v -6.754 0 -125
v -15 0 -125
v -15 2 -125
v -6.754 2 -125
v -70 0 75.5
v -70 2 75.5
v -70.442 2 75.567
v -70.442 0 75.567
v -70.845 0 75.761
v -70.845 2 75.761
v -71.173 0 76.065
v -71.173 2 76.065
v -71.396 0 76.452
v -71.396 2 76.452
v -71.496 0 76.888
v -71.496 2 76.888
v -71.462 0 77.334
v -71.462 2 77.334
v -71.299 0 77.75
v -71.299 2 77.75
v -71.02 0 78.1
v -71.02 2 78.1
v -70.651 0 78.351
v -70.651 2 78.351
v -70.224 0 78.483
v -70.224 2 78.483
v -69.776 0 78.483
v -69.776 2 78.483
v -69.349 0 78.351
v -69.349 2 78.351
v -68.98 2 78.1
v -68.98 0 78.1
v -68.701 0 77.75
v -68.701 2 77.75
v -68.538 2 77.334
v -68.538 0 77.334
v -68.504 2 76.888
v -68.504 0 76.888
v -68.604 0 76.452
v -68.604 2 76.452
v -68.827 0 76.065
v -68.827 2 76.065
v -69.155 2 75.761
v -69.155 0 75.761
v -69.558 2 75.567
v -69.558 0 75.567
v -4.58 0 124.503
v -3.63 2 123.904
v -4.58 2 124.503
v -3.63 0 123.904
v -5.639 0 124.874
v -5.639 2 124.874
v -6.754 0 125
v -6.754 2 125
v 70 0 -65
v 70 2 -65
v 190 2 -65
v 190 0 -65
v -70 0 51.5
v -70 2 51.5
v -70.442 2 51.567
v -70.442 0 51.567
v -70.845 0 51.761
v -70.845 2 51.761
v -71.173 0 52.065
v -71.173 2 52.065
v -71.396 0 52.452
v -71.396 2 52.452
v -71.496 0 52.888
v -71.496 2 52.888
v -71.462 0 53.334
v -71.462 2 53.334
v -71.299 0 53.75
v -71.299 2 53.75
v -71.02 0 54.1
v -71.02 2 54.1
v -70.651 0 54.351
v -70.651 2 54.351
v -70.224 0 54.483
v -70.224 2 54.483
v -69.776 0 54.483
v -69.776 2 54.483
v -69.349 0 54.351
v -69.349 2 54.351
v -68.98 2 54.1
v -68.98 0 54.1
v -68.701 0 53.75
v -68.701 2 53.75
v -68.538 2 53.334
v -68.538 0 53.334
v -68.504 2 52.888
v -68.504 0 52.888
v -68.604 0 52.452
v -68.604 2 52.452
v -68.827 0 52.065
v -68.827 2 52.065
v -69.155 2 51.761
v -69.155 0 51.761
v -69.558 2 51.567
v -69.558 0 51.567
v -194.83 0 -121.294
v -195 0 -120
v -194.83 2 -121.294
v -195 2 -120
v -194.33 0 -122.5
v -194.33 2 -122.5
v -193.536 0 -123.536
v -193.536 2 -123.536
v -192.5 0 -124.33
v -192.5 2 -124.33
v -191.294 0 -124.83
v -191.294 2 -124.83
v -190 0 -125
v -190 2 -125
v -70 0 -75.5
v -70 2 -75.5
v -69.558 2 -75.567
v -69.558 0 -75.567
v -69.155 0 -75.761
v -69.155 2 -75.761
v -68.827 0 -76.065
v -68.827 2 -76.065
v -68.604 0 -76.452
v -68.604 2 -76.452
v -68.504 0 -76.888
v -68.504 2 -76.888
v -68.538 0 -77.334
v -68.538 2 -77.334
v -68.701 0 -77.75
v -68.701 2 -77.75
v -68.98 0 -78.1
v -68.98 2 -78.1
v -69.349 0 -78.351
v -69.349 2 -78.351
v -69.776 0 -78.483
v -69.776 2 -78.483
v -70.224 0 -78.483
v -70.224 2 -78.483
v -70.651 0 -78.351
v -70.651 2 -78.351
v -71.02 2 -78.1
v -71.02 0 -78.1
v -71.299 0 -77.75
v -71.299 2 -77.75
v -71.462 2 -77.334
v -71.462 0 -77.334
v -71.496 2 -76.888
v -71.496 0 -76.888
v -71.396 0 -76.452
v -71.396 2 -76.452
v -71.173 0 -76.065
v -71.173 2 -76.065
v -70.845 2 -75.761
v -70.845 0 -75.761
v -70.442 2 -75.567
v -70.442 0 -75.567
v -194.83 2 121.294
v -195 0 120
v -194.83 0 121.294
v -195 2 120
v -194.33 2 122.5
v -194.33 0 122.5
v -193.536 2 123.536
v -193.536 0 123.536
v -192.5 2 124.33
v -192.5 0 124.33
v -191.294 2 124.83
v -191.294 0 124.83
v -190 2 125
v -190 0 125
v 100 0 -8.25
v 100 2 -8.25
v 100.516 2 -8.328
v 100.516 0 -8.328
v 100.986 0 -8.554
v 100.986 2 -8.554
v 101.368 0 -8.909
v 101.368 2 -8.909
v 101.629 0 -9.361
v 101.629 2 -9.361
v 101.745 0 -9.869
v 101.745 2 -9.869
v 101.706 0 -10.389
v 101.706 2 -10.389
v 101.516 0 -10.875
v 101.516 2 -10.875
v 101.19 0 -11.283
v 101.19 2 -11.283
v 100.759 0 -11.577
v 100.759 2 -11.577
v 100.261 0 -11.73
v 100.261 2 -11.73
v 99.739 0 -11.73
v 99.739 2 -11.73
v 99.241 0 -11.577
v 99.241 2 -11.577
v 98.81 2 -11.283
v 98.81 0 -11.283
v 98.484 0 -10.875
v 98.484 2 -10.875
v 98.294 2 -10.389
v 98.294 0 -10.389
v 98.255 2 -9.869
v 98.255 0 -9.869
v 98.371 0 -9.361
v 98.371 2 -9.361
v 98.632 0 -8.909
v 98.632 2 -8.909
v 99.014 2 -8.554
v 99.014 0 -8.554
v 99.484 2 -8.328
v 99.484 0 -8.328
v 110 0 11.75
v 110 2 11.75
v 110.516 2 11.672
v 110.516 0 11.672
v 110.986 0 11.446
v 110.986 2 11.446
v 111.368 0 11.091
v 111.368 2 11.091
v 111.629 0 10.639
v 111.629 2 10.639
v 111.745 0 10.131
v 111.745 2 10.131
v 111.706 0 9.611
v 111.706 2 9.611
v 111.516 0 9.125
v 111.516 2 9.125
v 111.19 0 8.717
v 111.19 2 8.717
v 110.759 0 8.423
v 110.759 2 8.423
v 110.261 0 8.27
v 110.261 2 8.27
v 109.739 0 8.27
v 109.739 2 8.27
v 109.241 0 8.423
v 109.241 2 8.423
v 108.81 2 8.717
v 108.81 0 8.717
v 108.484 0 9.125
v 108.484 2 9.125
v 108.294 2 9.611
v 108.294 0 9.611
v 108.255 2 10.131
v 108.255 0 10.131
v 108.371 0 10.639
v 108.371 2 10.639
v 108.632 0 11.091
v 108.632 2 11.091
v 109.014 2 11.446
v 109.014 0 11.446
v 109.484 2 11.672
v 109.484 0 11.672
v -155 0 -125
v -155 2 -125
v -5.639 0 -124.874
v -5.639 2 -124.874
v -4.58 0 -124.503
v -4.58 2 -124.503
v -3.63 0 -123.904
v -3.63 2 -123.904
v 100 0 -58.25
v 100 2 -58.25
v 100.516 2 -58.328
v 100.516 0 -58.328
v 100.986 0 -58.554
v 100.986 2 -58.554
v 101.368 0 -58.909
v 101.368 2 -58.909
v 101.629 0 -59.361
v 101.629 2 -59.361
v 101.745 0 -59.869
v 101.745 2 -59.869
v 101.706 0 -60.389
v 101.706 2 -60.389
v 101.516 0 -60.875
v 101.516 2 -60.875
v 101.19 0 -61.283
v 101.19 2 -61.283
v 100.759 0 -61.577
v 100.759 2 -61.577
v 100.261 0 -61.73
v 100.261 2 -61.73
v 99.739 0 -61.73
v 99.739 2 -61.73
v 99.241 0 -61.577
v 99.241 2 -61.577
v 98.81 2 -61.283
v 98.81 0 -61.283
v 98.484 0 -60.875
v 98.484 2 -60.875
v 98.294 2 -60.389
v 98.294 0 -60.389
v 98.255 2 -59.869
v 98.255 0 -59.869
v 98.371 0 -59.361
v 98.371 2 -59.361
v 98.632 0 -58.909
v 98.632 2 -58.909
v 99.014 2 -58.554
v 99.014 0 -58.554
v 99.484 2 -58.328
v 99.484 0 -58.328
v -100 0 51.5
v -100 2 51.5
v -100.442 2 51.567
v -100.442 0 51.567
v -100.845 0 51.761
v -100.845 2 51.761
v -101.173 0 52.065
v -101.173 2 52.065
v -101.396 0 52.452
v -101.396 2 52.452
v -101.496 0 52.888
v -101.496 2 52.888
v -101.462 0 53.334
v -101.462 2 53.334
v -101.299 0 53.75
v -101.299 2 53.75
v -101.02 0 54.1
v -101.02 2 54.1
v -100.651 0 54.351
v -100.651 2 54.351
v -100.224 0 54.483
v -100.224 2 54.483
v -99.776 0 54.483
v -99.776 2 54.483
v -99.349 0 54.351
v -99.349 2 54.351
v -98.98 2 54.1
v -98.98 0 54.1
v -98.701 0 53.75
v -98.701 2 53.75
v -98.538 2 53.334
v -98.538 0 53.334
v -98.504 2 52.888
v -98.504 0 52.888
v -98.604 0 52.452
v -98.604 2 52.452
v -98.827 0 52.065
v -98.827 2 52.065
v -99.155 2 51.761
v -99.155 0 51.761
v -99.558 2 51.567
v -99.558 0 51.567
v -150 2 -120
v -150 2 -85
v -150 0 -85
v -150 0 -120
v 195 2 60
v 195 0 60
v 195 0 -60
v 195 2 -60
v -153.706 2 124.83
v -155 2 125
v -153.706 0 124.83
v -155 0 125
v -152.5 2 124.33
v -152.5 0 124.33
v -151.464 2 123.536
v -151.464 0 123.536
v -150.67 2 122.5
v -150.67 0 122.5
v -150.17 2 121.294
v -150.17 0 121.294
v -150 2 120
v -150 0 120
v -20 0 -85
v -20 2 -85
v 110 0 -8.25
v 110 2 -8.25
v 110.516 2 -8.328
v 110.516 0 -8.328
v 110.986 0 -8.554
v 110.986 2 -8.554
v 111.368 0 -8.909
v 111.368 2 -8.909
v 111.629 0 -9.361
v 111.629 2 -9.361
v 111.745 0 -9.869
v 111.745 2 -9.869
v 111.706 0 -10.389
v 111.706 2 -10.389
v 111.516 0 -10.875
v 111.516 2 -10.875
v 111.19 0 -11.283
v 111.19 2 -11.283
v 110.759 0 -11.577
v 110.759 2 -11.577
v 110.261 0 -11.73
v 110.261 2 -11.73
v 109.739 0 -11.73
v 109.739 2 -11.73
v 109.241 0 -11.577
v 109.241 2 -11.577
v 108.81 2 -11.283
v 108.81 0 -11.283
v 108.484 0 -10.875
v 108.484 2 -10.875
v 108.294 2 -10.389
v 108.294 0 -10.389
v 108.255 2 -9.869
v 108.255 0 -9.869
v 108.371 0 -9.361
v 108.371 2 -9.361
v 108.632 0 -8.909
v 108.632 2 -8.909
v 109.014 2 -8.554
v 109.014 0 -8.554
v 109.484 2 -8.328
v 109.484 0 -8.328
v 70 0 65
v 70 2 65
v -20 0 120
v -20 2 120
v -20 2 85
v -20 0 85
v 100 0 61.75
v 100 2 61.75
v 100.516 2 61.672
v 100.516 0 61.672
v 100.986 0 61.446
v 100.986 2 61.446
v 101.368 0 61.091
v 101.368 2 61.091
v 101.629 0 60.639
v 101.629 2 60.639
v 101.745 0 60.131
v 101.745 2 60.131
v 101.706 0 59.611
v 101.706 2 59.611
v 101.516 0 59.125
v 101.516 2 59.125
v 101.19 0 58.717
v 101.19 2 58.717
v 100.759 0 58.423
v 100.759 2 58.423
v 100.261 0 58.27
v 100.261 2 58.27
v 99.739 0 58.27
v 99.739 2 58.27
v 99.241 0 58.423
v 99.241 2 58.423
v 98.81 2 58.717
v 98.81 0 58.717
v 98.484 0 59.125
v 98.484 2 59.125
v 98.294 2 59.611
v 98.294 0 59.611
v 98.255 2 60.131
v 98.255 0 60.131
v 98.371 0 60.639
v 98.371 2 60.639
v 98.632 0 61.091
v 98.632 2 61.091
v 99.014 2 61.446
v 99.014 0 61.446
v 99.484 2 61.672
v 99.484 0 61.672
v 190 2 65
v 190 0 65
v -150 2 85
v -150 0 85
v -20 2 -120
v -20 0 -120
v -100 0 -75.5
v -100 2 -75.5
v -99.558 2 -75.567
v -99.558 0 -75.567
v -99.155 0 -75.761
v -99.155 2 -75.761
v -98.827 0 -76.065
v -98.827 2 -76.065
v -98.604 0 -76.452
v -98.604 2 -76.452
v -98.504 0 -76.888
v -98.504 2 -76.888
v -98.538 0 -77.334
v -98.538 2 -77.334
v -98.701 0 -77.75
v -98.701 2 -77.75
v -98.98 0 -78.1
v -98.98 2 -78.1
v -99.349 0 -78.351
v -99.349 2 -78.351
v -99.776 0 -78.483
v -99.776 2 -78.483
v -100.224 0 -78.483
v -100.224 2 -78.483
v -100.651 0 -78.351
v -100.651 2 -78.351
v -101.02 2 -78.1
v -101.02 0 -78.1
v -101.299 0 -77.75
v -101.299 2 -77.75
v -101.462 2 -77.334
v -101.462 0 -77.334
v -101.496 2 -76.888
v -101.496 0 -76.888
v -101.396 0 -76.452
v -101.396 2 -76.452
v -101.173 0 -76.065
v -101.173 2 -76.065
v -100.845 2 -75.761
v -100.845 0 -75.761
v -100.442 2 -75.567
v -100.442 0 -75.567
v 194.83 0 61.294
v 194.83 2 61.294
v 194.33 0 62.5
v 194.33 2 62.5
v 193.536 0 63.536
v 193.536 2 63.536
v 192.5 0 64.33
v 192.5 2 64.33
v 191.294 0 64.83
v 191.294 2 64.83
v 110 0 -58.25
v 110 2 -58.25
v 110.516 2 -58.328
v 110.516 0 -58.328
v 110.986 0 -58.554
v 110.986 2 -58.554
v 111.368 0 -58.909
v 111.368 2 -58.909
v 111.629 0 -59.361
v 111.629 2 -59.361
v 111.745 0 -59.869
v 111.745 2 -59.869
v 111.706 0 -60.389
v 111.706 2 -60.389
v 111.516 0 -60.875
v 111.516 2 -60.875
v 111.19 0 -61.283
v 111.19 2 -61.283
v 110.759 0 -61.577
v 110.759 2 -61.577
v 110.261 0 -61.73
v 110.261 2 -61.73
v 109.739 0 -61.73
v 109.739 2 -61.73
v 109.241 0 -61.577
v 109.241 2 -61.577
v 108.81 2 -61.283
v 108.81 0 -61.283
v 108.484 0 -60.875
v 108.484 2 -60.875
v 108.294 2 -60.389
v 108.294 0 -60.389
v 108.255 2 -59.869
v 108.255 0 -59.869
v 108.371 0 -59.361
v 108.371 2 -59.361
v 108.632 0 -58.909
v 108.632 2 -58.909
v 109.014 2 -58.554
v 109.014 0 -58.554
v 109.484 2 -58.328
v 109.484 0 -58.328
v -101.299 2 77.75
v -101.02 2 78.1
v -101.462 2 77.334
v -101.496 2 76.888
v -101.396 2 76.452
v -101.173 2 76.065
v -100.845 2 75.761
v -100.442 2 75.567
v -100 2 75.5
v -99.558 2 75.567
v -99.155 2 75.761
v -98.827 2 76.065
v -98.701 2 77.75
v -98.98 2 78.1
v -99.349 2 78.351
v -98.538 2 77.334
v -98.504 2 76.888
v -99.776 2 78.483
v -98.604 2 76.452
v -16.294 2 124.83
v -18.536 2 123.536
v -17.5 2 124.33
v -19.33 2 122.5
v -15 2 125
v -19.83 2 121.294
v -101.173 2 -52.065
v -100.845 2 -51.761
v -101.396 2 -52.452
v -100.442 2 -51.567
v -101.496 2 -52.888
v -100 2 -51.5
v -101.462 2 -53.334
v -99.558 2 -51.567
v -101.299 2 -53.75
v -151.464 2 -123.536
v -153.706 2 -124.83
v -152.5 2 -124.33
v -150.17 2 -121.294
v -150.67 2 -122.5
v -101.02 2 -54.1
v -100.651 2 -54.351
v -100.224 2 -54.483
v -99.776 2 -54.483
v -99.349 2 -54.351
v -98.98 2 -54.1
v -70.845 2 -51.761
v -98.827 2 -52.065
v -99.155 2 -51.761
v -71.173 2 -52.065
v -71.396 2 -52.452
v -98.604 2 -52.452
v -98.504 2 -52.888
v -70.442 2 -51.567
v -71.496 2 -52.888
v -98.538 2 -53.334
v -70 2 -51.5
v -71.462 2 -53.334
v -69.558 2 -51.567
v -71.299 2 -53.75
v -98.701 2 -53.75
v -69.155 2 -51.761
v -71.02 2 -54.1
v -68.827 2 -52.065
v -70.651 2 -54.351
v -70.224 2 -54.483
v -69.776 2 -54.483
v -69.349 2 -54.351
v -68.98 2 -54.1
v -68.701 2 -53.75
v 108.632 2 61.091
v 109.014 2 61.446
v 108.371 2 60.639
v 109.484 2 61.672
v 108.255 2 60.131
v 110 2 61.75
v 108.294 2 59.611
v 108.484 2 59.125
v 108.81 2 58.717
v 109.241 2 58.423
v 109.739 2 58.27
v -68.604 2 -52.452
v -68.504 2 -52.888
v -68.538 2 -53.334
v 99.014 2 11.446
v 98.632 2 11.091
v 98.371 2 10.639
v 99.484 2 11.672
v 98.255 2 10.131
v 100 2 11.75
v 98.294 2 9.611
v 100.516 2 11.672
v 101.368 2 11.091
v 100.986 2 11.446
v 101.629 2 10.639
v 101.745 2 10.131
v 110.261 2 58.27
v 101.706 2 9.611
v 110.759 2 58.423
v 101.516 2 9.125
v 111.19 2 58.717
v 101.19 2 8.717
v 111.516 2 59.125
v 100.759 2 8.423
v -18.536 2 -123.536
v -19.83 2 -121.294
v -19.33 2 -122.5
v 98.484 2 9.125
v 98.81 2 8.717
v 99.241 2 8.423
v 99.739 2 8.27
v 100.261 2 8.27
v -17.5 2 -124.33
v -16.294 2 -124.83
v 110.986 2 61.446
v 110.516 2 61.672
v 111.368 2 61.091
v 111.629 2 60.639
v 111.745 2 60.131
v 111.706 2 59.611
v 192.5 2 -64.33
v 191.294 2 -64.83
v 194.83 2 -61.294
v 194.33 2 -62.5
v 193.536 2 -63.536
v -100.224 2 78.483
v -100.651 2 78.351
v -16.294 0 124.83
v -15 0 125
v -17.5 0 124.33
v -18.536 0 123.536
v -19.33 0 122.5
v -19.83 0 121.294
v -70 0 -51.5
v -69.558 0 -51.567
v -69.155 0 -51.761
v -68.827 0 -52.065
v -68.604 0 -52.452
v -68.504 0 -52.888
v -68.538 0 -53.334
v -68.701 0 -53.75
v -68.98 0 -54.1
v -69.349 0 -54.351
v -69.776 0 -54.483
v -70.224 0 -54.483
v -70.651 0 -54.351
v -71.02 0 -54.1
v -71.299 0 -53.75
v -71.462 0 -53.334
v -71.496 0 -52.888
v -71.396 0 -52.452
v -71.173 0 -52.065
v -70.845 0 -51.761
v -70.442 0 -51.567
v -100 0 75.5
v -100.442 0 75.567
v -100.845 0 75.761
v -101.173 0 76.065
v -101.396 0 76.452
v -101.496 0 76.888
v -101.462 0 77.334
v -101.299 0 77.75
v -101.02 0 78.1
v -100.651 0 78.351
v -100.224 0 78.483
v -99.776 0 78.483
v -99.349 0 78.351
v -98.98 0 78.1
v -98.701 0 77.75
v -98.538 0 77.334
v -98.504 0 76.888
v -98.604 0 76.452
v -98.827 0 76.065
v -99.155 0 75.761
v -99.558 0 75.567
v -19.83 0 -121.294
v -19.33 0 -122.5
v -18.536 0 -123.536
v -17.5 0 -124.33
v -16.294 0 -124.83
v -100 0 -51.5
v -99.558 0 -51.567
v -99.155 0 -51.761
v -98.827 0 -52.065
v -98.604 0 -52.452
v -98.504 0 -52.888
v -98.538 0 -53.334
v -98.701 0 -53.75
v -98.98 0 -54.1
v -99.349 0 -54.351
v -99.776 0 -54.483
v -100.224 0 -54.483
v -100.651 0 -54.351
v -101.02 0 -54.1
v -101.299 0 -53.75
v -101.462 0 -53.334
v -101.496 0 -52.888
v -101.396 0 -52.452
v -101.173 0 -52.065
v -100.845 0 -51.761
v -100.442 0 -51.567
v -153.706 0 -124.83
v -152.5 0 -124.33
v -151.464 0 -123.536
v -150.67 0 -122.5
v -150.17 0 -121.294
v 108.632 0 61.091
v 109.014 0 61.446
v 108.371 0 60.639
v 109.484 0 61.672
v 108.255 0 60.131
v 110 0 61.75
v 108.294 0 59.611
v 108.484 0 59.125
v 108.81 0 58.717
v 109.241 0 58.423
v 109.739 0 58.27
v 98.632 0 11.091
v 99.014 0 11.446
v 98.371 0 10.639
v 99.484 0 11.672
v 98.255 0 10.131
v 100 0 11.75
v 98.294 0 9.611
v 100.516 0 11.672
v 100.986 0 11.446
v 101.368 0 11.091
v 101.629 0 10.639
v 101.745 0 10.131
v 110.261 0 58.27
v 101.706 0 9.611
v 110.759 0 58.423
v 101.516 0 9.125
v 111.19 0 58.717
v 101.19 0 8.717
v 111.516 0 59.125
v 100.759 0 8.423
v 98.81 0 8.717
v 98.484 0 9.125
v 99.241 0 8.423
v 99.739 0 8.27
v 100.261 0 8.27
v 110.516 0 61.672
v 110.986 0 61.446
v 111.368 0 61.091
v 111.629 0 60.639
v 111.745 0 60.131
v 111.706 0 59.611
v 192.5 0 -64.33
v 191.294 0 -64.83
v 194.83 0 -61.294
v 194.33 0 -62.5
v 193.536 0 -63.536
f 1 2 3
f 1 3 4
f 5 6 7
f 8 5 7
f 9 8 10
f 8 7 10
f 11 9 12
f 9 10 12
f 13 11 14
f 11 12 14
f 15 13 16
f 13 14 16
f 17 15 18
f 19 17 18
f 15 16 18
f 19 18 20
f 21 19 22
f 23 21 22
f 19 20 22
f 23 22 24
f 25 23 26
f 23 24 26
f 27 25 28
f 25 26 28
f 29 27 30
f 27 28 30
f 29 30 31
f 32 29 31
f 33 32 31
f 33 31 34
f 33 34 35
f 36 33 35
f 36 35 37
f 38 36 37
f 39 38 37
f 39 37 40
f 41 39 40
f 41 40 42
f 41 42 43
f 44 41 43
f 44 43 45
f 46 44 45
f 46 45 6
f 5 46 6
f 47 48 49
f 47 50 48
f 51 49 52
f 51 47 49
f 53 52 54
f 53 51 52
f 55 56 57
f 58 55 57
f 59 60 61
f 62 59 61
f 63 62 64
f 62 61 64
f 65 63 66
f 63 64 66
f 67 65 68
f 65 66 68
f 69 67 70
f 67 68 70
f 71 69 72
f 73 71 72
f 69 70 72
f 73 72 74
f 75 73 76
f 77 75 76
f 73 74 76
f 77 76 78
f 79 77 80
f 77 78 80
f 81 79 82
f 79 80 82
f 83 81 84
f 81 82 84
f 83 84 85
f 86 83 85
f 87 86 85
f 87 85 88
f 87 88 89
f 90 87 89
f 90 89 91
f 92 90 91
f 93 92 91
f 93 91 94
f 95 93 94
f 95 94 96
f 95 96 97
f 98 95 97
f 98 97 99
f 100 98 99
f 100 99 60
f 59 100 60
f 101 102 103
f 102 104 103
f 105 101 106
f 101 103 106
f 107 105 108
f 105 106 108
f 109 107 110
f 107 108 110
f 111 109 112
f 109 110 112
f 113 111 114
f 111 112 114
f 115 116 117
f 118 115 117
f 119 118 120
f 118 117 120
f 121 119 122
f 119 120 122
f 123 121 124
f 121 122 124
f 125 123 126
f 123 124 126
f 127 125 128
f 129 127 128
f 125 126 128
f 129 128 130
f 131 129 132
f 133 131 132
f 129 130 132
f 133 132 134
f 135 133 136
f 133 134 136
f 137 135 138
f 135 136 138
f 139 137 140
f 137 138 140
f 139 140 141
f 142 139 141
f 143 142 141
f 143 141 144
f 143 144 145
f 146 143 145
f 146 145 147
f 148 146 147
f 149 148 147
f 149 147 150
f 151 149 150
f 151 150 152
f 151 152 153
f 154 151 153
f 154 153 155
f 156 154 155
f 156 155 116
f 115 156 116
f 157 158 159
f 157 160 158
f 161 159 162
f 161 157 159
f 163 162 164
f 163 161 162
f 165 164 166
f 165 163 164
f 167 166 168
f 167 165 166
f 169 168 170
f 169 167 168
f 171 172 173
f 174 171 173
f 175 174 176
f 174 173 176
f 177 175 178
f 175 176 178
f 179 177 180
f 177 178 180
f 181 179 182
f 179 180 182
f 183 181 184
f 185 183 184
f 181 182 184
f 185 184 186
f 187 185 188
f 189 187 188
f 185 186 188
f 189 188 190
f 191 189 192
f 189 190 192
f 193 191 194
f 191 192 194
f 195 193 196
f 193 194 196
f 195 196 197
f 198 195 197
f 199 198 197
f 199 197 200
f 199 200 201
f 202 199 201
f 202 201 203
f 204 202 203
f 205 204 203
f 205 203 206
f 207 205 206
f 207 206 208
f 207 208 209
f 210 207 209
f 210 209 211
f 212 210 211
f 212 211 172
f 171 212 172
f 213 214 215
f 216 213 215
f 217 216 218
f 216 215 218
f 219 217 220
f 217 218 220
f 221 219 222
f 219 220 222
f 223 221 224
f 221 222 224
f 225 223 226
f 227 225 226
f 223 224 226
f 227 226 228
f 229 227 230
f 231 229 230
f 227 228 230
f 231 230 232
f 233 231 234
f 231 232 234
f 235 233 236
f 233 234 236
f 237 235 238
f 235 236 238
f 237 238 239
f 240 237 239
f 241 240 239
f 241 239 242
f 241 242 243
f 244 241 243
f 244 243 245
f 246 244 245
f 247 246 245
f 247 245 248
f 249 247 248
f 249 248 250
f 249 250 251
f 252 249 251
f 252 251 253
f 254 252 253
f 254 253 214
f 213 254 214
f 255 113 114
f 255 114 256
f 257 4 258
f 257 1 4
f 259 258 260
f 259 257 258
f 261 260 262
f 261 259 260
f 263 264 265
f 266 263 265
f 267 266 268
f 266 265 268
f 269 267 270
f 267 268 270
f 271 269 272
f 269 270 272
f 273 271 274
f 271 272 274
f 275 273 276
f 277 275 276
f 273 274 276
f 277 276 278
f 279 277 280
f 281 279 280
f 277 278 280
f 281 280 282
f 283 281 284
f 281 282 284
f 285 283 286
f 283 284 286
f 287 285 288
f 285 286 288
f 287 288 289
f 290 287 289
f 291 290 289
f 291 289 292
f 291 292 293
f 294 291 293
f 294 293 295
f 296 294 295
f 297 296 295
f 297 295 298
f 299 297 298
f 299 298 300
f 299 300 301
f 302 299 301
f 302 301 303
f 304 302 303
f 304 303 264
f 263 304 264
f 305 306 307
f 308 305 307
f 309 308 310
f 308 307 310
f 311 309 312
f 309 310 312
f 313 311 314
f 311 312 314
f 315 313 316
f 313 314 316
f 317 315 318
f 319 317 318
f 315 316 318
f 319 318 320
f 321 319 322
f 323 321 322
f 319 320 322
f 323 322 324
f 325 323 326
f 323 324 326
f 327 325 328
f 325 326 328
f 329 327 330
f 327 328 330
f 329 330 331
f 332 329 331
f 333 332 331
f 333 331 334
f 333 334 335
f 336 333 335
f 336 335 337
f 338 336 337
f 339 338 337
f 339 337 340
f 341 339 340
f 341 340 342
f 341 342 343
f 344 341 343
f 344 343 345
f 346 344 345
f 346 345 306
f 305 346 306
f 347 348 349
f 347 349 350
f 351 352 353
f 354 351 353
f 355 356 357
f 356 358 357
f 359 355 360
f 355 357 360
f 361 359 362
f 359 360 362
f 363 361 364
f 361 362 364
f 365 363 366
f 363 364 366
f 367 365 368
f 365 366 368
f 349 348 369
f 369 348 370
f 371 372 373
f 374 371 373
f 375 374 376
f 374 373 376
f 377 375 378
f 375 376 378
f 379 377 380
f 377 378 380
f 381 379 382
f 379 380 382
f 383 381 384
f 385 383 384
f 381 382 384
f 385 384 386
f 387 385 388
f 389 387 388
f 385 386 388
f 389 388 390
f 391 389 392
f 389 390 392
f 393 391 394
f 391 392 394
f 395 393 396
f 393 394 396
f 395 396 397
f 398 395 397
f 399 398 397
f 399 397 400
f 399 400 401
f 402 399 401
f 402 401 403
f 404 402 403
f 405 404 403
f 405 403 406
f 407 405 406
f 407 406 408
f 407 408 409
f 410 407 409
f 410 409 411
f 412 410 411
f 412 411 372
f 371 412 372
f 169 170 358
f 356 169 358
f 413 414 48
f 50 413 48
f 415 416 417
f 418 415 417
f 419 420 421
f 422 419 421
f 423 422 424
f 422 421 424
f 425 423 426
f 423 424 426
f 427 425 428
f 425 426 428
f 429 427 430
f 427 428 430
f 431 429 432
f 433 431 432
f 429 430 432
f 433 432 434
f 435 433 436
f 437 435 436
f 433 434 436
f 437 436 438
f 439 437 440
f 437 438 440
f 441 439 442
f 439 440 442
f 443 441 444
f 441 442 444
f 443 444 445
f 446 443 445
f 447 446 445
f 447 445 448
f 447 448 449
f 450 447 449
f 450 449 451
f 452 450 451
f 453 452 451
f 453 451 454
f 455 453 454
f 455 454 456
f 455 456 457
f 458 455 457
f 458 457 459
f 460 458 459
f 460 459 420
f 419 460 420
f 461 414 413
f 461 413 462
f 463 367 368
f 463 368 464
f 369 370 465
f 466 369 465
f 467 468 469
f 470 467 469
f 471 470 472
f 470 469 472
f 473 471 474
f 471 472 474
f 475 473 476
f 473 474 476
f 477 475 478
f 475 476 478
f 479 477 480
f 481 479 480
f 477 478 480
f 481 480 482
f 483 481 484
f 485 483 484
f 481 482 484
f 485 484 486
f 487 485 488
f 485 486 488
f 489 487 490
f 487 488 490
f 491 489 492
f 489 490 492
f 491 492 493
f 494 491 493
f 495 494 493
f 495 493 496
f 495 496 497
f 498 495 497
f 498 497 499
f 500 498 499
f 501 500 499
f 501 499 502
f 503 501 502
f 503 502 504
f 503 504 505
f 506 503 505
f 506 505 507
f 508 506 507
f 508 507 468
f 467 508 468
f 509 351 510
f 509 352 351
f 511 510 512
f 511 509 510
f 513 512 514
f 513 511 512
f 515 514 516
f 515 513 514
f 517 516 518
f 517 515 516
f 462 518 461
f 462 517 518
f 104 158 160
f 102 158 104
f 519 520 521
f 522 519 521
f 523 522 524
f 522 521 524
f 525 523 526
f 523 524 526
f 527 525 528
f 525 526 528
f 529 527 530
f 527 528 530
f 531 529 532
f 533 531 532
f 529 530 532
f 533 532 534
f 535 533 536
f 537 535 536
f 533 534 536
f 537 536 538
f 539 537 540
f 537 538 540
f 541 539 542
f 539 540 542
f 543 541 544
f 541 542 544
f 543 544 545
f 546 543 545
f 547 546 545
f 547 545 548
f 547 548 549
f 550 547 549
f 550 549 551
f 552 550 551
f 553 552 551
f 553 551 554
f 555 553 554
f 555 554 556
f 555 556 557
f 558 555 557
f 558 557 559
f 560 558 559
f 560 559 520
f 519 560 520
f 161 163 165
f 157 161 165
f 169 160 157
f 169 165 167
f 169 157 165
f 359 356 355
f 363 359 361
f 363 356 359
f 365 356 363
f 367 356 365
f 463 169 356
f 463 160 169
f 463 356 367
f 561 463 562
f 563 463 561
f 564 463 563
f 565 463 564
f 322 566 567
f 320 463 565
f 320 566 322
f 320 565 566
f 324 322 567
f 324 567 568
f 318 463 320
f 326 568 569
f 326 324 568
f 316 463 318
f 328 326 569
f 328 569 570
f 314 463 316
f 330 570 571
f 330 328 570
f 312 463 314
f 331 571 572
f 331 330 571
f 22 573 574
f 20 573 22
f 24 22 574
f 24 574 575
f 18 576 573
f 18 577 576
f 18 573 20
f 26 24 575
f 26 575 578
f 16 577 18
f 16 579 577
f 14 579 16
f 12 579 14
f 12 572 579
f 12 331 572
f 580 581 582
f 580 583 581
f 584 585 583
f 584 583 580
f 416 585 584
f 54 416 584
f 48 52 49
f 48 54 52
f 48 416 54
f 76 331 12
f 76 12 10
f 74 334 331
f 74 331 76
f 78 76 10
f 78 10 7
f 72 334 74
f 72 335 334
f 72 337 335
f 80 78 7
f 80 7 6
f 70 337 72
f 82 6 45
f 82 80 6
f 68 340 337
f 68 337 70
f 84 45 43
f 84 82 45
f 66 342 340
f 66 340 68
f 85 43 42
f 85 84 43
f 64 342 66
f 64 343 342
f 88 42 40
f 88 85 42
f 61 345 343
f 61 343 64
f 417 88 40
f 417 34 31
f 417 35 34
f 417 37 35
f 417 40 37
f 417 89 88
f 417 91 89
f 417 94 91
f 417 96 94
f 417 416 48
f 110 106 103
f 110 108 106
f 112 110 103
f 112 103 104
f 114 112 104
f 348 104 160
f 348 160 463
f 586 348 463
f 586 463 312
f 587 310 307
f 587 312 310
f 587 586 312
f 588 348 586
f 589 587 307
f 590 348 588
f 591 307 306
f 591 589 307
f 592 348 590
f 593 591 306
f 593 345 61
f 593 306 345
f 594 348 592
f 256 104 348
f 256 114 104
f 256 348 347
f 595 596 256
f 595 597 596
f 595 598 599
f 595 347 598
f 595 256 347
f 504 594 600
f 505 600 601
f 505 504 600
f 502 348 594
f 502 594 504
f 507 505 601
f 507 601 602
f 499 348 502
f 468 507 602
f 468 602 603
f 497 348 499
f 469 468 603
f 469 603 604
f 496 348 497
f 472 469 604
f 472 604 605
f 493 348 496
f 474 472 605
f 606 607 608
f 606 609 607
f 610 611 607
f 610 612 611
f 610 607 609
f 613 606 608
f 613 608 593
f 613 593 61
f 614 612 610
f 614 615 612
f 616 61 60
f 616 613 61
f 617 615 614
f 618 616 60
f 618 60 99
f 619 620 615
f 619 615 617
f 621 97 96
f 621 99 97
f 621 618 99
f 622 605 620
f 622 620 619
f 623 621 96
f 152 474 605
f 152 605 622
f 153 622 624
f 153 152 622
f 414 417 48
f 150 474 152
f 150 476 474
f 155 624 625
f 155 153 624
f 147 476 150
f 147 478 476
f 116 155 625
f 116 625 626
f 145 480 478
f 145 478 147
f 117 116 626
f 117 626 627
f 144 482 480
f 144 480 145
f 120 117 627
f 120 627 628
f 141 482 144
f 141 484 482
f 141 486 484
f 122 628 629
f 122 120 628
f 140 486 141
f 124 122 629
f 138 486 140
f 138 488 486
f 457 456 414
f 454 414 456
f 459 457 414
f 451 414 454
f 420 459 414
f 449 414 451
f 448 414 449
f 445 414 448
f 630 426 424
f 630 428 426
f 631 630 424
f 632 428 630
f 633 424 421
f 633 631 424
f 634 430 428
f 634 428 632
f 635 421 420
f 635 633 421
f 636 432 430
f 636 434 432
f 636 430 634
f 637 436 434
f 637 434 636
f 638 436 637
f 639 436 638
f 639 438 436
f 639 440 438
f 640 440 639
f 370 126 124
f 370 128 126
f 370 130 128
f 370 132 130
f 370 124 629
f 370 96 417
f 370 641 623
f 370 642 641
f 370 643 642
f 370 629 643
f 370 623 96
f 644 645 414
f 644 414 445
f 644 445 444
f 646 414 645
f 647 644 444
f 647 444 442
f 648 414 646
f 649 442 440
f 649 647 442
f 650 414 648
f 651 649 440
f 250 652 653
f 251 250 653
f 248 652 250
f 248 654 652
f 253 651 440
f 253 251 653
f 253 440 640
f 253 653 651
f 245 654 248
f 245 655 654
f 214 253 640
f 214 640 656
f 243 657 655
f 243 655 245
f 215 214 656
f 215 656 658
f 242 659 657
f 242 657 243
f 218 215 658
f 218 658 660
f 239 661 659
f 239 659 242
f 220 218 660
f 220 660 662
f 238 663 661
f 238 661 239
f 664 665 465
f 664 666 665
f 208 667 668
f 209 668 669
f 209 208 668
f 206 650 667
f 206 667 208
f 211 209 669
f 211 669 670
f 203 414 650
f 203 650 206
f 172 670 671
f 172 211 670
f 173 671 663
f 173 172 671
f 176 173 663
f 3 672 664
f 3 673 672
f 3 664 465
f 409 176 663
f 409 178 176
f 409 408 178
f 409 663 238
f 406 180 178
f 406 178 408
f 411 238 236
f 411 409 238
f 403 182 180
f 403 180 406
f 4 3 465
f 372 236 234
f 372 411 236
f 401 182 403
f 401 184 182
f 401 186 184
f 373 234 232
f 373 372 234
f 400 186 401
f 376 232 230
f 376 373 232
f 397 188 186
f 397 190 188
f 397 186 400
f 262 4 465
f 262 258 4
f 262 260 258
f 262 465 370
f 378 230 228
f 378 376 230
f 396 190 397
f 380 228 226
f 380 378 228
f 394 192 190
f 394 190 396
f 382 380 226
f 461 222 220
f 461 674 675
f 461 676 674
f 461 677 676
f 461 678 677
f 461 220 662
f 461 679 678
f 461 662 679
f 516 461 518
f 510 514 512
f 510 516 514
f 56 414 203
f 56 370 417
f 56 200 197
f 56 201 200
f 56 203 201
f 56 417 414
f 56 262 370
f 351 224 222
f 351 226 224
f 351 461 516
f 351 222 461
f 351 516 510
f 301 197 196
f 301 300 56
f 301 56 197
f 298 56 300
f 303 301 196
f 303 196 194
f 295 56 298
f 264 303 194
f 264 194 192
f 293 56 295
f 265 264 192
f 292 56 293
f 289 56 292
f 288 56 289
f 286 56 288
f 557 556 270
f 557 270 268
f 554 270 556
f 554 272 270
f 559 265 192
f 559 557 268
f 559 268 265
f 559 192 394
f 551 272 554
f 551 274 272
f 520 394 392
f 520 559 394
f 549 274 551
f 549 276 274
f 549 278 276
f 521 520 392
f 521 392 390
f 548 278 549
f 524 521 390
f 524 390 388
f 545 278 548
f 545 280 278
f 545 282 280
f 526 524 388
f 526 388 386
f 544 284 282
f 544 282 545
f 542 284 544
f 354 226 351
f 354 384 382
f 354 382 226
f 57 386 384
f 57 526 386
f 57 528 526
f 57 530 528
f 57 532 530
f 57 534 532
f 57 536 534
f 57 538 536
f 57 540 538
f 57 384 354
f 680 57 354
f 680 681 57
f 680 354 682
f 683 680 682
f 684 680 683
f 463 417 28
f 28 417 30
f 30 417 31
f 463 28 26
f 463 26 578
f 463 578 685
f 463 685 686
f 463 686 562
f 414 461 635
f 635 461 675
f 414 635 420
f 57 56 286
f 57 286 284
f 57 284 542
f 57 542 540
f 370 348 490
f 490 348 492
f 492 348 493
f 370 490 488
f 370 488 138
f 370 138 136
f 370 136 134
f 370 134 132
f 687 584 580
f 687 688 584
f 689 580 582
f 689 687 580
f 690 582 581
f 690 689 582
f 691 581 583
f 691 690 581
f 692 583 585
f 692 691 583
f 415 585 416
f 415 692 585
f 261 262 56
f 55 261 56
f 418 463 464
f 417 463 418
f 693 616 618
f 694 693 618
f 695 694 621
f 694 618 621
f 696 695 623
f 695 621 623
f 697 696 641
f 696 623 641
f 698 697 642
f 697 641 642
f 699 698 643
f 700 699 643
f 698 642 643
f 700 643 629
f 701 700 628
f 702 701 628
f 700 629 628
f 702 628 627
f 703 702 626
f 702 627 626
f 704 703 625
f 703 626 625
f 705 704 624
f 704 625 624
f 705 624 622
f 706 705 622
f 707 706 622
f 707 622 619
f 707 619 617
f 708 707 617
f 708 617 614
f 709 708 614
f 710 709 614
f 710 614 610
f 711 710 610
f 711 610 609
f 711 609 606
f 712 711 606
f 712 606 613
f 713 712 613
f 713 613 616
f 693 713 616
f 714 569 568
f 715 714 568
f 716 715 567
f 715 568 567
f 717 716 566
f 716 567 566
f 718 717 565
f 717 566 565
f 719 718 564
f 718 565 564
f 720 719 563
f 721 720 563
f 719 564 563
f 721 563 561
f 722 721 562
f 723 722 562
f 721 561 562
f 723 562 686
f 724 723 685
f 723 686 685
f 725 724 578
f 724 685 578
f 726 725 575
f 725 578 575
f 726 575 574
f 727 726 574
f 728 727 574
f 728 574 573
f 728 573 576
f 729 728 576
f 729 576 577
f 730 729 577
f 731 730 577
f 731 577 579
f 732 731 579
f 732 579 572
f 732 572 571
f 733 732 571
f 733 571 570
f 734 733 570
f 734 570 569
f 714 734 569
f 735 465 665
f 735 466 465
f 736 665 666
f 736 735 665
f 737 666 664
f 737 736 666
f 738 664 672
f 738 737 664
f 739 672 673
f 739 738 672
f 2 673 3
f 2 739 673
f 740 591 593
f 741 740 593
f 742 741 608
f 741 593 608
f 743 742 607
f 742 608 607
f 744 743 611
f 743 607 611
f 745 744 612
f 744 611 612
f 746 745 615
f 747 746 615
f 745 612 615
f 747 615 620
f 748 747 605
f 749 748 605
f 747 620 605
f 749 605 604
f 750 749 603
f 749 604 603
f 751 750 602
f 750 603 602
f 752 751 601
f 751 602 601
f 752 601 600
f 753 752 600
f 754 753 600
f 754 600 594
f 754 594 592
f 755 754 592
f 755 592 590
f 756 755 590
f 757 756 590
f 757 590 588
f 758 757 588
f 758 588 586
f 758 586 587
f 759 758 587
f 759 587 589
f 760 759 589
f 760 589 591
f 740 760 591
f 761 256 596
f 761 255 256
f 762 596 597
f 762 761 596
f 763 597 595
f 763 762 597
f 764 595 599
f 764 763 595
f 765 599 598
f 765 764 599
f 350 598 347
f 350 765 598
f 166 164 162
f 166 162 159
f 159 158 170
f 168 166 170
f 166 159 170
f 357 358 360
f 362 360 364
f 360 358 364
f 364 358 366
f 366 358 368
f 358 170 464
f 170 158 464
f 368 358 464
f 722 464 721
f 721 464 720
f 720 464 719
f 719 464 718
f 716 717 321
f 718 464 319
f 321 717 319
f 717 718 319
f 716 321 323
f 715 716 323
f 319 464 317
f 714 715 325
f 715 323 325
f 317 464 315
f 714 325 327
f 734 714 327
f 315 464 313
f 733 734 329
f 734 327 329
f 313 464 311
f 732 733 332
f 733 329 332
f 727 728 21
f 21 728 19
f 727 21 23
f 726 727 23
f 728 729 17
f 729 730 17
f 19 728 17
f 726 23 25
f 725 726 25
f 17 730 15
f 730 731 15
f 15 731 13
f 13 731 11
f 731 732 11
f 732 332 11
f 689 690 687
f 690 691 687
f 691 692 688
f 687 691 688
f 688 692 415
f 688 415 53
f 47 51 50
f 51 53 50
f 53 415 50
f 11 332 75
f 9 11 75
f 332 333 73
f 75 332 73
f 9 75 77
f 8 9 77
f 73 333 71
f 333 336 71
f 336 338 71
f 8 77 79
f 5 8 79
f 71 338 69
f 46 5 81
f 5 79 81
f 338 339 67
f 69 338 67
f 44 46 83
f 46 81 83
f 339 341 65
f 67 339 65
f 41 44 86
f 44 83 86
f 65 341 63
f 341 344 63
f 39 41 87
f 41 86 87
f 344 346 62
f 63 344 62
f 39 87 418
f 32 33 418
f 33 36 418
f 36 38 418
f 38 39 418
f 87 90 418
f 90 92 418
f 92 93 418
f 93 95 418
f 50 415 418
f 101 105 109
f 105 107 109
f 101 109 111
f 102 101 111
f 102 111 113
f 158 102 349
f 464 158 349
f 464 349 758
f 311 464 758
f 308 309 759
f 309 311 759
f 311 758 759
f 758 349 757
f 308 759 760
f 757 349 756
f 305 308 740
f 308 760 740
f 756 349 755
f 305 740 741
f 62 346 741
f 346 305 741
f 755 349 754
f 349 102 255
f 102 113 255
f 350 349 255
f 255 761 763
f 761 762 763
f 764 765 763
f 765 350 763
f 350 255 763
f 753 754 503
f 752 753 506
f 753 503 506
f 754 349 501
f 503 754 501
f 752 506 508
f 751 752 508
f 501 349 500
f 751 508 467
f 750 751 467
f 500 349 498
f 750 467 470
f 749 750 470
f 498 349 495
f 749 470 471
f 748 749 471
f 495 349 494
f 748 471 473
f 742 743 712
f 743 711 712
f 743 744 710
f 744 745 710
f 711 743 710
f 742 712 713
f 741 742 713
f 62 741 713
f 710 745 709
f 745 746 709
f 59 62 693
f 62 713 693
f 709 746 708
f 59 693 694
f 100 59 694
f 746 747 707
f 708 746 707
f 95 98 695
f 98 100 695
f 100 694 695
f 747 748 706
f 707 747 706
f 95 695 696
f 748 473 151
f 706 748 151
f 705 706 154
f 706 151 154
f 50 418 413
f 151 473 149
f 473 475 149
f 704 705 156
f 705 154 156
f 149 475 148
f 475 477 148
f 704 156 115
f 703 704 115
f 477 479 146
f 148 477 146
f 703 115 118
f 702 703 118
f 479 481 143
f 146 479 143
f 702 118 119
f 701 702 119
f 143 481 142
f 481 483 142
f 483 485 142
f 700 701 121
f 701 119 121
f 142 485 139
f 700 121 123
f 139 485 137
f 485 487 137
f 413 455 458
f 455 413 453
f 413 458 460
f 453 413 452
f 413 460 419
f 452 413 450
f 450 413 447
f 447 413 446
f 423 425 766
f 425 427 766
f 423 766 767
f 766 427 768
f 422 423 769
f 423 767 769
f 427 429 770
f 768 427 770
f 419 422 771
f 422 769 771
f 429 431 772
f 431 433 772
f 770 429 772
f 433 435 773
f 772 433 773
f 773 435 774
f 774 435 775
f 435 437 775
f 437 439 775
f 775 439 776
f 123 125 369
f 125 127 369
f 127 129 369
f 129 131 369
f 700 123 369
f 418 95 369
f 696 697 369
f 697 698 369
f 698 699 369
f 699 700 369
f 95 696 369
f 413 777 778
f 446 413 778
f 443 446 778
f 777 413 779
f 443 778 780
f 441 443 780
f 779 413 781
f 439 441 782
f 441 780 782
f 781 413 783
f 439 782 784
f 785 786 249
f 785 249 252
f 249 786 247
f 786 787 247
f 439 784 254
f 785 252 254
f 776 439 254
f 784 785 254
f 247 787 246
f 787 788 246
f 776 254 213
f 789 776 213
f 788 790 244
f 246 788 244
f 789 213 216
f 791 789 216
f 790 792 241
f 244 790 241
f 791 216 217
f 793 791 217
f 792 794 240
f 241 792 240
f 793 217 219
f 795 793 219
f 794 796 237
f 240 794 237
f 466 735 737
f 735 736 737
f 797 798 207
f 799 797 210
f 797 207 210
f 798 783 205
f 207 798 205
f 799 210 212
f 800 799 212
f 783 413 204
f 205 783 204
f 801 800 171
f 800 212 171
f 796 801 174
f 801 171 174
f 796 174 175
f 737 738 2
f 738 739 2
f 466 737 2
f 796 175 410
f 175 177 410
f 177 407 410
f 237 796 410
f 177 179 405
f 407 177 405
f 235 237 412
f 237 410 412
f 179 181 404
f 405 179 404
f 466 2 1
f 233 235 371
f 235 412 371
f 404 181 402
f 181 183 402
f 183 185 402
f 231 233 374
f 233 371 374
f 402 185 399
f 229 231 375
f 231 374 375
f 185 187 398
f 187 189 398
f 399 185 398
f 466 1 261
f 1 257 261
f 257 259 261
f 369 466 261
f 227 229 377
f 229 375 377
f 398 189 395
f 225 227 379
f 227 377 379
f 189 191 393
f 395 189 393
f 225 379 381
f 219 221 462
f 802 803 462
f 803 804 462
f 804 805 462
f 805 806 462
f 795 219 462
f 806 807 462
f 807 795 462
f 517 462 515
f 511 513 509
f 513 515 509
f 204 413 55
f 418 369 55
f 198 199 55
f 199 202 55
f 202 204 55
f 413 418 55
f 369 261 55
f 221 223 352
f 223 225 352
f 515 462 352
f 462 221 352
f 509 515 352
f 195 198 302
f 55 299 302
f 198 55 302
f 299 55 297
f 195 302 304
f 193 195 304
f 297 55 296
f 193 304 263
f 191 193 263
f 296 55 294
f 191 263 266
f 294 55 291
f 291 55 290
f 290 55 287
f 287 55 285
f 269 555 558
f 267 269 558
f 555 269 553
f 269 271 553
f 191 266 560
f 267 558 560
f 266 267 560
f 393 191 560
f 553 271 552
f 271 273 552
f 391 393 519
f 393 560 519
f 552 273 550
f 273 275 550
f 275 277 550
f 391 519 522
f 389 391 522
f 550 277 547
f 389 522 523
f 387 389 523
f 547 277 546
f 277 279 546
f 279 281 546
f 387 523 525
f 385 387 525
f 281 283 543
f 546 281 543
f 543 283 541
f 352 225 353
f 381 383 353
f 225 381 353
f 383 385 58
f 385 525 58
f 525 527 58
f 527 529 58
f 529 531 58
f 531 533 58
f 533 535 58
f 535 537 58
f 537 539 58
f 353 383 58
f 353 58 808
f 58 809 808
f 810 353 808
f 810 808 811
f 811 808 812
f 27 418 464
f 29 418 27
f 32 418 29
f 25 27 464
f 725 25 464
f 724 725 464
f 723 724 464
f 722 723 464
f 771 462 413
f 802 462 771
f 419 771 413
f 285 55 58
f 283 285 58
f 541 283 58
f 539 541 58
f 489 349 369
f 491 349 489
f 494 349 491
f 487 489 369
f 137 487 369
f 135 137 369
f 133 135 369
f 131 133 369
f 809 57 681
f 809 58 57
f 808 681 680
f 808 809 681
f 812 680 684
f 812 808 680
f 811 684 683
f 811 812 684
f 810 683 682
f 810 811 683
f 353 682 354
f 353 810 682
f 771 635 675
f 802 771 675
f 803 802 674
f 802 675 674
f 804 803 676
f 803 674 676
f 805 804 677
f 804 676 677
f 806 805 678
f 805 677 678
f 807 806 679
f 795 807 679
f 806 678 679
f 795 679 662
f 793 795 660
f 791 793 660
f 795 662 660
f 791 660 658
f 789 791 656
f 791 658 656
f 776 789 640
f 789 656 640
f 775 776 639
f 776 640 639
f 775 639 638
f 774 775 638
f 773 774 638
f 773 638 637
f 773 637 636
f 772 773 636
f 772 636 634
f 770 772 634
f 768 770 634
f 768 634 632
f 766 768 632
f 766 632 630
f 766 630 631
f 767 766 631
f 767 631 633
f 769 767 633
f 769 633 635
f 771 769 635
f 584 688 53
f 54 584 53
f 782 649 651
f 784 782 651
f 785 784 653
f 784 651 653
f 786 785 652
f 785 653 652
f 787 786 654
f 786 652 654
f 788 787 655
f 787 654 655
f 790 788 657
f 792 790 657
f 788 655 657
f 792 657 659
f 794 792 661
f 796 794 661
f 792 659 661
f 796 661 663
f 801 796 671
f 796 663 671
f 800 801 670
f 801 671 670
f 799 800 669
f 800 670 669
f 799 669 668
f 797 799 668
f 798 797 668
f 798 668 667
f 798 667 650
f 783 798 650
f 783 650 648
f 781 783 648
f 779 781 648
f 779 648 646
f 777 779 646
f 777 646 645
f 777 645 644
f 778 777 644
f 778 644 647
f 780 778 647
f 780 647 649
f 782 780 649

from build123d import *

# Parameters (mm, degrees)
SKETCH_1_W          = 390
SKETCH_1_H          = 250
EXTRUDE_1_DEPTH     = 2
SKETCH_2_W          = 130
SKETCH_2_H          = 40
SKETCH_2_W_2        = 125
SKETCH_2_H_2        = 60
CUT_EXTRUDE_1_DEPTH = 5
CUT_EXTRUDE_2_DEPTH = 10
FILLET_1_R          = 5
SKETCH_4_R          = 1.5
SKETCH_4_R_2        = 1.75
CUT_EXTRUDE_3_DEPTH = 232.633330935


with BuildPart() as part:
    # 스케치1 → 보스-돌출1 (new body)
    with BuildSketch(Plane(origin=(0, 0, 0), x_dir=(1, 0, 0), z_dir=(0, 1, 0))):
        Rectangle(SKETCH_1_W, SKETCH_1_H)
    extrude(amount=EXTRUDE_1_DEPTH)

    # 스케치2 → 컷-돌출1 (cut)
    with BuildSketch(Plane(origin=(0, 2, 0), x_dir=(1, 0, 0), z_dir=(0, 1, 0))):
        with Locations((-85, 105)):
            Rectangle(SKETCH_2_W, SKETCH_2_H)
        with Locations((-85, -105)):
            Rectangle(SKETCH_2_W, SKETCH_2_H)
        with Locations((132.5, 95)):
            Rectangle(SKETCH_2_W_2, SKETCH_2_H_2)
        with Locations((132.5, -95)):
            Rectangle(SKETCH_2_W_2, SKETCH_2_H_2)
    extrude(amount=-CUT_EXTRUDE_1_DEPTH, mode=Mode.SUBTRACT)

    # 스케치3 → 컷-돌출2 (cut)
    with BuildSketch(Plane(origin=(0, 2, 0), x_dir=(1, 0, 0), z_dir=(0, 1, 0))):
        Polygon((-5, 125), (70, 65), (70, 125), align=None)
        Polygon((70, -65), (-5, -125), (70, -125), align=None)
    extrude(amount=-CUT_EXTRUDE_2_DEPTH, mode=Mode.SUBTRACT)

    # 필렛1
    fillet_1_edges = [part.edges().sort_by_distance(p)[0] for p in [
        (-5, 1, -125),
        (-5, 1, 125),
        (-150, 1, 125),
        (-20, 1, 125),
        (195, 1, -65),
        (195, 1, 65),
        (-150, 1, -125),
        (-20, 1, -125),
        (-195, 1, 125),
        (-195, 1, -125),
    ]]
    fillet(fillet_1_edges, radius=FILLET_1_R)

    # 스케치4 → 컷-돌출3 (cut, through all)
    with BuildSketch(Plane(origin=(0, 2, 0), x_dir=(1, 0, 0), z_dir=(0, 1, 0))):
        with Locations(Location((-100, 77, 0), (0, 0, 270))):
            Circle(SKETCH_4_R)
        with Locations(Location((-70, 77, 0), (0, 0, 270))):
            Circle(SKETCH_4_R)
        with Locations(Location((-70, 53, 0), (0, 0, 270))):
            Circle(SKETCH_4_R)
        with Locations(Location((-100, 53, 0), (0, 0, 270))):
            Circle(SKETCH_4_R)
        with Locations(Location((-100, -53, 0), (0, 0, 90))):
            Circle(SKETCH_4_R)
        with Locations(Location((-70, -53, 0), (0, 0, 90))):
            Circle(SKETCH_4_R)
        with Locations(Location((-70, -77, 0), (0, 0, 90))):
            Circle(SKETCH_4_R)
        with Locations(Location((-100, -77, 0), (0, 0, 90))):
            Circle(SKETCH_4_R)
        with Locations(Location((100, 60, 0), (0, 0, 270))):
            Circle(SKETCH_4_R_2)
        with Locations(Location((110, 60, 0), (0, 0, 270))):
            Circle(SKETCH_4_R_2)
        with Locations(Location((100, 10, 0), (0, 0, 270))):
            Circle(SKETCH_4_R_2)
        with Locations(Location((110, 10, 0), (0, 0, 270))):
            Circle(SKETCH_4_R_2)
        with Locations(Location((100, -10, 0), (0, 0, 270))):
            Circle(SKETCH_4_R_2)
        with Locations(Location((110, -10, 0), (0, 0, 270))):
            Circle(SKETCH_4_R_2)
        with Locations(Location((100, -60, 0), (0, 0, 270))):
            Circle(SKETCH_4_R_2)
        with Locations(Location((110, -60, 0), (0, 0, 270))):
            Circle(SKETCH_4_R_2)
    extrude(amount=-CUT_EXTRUDE_3_DEPTH, mode=Mode.SUBTRACT)


solid = part.part
